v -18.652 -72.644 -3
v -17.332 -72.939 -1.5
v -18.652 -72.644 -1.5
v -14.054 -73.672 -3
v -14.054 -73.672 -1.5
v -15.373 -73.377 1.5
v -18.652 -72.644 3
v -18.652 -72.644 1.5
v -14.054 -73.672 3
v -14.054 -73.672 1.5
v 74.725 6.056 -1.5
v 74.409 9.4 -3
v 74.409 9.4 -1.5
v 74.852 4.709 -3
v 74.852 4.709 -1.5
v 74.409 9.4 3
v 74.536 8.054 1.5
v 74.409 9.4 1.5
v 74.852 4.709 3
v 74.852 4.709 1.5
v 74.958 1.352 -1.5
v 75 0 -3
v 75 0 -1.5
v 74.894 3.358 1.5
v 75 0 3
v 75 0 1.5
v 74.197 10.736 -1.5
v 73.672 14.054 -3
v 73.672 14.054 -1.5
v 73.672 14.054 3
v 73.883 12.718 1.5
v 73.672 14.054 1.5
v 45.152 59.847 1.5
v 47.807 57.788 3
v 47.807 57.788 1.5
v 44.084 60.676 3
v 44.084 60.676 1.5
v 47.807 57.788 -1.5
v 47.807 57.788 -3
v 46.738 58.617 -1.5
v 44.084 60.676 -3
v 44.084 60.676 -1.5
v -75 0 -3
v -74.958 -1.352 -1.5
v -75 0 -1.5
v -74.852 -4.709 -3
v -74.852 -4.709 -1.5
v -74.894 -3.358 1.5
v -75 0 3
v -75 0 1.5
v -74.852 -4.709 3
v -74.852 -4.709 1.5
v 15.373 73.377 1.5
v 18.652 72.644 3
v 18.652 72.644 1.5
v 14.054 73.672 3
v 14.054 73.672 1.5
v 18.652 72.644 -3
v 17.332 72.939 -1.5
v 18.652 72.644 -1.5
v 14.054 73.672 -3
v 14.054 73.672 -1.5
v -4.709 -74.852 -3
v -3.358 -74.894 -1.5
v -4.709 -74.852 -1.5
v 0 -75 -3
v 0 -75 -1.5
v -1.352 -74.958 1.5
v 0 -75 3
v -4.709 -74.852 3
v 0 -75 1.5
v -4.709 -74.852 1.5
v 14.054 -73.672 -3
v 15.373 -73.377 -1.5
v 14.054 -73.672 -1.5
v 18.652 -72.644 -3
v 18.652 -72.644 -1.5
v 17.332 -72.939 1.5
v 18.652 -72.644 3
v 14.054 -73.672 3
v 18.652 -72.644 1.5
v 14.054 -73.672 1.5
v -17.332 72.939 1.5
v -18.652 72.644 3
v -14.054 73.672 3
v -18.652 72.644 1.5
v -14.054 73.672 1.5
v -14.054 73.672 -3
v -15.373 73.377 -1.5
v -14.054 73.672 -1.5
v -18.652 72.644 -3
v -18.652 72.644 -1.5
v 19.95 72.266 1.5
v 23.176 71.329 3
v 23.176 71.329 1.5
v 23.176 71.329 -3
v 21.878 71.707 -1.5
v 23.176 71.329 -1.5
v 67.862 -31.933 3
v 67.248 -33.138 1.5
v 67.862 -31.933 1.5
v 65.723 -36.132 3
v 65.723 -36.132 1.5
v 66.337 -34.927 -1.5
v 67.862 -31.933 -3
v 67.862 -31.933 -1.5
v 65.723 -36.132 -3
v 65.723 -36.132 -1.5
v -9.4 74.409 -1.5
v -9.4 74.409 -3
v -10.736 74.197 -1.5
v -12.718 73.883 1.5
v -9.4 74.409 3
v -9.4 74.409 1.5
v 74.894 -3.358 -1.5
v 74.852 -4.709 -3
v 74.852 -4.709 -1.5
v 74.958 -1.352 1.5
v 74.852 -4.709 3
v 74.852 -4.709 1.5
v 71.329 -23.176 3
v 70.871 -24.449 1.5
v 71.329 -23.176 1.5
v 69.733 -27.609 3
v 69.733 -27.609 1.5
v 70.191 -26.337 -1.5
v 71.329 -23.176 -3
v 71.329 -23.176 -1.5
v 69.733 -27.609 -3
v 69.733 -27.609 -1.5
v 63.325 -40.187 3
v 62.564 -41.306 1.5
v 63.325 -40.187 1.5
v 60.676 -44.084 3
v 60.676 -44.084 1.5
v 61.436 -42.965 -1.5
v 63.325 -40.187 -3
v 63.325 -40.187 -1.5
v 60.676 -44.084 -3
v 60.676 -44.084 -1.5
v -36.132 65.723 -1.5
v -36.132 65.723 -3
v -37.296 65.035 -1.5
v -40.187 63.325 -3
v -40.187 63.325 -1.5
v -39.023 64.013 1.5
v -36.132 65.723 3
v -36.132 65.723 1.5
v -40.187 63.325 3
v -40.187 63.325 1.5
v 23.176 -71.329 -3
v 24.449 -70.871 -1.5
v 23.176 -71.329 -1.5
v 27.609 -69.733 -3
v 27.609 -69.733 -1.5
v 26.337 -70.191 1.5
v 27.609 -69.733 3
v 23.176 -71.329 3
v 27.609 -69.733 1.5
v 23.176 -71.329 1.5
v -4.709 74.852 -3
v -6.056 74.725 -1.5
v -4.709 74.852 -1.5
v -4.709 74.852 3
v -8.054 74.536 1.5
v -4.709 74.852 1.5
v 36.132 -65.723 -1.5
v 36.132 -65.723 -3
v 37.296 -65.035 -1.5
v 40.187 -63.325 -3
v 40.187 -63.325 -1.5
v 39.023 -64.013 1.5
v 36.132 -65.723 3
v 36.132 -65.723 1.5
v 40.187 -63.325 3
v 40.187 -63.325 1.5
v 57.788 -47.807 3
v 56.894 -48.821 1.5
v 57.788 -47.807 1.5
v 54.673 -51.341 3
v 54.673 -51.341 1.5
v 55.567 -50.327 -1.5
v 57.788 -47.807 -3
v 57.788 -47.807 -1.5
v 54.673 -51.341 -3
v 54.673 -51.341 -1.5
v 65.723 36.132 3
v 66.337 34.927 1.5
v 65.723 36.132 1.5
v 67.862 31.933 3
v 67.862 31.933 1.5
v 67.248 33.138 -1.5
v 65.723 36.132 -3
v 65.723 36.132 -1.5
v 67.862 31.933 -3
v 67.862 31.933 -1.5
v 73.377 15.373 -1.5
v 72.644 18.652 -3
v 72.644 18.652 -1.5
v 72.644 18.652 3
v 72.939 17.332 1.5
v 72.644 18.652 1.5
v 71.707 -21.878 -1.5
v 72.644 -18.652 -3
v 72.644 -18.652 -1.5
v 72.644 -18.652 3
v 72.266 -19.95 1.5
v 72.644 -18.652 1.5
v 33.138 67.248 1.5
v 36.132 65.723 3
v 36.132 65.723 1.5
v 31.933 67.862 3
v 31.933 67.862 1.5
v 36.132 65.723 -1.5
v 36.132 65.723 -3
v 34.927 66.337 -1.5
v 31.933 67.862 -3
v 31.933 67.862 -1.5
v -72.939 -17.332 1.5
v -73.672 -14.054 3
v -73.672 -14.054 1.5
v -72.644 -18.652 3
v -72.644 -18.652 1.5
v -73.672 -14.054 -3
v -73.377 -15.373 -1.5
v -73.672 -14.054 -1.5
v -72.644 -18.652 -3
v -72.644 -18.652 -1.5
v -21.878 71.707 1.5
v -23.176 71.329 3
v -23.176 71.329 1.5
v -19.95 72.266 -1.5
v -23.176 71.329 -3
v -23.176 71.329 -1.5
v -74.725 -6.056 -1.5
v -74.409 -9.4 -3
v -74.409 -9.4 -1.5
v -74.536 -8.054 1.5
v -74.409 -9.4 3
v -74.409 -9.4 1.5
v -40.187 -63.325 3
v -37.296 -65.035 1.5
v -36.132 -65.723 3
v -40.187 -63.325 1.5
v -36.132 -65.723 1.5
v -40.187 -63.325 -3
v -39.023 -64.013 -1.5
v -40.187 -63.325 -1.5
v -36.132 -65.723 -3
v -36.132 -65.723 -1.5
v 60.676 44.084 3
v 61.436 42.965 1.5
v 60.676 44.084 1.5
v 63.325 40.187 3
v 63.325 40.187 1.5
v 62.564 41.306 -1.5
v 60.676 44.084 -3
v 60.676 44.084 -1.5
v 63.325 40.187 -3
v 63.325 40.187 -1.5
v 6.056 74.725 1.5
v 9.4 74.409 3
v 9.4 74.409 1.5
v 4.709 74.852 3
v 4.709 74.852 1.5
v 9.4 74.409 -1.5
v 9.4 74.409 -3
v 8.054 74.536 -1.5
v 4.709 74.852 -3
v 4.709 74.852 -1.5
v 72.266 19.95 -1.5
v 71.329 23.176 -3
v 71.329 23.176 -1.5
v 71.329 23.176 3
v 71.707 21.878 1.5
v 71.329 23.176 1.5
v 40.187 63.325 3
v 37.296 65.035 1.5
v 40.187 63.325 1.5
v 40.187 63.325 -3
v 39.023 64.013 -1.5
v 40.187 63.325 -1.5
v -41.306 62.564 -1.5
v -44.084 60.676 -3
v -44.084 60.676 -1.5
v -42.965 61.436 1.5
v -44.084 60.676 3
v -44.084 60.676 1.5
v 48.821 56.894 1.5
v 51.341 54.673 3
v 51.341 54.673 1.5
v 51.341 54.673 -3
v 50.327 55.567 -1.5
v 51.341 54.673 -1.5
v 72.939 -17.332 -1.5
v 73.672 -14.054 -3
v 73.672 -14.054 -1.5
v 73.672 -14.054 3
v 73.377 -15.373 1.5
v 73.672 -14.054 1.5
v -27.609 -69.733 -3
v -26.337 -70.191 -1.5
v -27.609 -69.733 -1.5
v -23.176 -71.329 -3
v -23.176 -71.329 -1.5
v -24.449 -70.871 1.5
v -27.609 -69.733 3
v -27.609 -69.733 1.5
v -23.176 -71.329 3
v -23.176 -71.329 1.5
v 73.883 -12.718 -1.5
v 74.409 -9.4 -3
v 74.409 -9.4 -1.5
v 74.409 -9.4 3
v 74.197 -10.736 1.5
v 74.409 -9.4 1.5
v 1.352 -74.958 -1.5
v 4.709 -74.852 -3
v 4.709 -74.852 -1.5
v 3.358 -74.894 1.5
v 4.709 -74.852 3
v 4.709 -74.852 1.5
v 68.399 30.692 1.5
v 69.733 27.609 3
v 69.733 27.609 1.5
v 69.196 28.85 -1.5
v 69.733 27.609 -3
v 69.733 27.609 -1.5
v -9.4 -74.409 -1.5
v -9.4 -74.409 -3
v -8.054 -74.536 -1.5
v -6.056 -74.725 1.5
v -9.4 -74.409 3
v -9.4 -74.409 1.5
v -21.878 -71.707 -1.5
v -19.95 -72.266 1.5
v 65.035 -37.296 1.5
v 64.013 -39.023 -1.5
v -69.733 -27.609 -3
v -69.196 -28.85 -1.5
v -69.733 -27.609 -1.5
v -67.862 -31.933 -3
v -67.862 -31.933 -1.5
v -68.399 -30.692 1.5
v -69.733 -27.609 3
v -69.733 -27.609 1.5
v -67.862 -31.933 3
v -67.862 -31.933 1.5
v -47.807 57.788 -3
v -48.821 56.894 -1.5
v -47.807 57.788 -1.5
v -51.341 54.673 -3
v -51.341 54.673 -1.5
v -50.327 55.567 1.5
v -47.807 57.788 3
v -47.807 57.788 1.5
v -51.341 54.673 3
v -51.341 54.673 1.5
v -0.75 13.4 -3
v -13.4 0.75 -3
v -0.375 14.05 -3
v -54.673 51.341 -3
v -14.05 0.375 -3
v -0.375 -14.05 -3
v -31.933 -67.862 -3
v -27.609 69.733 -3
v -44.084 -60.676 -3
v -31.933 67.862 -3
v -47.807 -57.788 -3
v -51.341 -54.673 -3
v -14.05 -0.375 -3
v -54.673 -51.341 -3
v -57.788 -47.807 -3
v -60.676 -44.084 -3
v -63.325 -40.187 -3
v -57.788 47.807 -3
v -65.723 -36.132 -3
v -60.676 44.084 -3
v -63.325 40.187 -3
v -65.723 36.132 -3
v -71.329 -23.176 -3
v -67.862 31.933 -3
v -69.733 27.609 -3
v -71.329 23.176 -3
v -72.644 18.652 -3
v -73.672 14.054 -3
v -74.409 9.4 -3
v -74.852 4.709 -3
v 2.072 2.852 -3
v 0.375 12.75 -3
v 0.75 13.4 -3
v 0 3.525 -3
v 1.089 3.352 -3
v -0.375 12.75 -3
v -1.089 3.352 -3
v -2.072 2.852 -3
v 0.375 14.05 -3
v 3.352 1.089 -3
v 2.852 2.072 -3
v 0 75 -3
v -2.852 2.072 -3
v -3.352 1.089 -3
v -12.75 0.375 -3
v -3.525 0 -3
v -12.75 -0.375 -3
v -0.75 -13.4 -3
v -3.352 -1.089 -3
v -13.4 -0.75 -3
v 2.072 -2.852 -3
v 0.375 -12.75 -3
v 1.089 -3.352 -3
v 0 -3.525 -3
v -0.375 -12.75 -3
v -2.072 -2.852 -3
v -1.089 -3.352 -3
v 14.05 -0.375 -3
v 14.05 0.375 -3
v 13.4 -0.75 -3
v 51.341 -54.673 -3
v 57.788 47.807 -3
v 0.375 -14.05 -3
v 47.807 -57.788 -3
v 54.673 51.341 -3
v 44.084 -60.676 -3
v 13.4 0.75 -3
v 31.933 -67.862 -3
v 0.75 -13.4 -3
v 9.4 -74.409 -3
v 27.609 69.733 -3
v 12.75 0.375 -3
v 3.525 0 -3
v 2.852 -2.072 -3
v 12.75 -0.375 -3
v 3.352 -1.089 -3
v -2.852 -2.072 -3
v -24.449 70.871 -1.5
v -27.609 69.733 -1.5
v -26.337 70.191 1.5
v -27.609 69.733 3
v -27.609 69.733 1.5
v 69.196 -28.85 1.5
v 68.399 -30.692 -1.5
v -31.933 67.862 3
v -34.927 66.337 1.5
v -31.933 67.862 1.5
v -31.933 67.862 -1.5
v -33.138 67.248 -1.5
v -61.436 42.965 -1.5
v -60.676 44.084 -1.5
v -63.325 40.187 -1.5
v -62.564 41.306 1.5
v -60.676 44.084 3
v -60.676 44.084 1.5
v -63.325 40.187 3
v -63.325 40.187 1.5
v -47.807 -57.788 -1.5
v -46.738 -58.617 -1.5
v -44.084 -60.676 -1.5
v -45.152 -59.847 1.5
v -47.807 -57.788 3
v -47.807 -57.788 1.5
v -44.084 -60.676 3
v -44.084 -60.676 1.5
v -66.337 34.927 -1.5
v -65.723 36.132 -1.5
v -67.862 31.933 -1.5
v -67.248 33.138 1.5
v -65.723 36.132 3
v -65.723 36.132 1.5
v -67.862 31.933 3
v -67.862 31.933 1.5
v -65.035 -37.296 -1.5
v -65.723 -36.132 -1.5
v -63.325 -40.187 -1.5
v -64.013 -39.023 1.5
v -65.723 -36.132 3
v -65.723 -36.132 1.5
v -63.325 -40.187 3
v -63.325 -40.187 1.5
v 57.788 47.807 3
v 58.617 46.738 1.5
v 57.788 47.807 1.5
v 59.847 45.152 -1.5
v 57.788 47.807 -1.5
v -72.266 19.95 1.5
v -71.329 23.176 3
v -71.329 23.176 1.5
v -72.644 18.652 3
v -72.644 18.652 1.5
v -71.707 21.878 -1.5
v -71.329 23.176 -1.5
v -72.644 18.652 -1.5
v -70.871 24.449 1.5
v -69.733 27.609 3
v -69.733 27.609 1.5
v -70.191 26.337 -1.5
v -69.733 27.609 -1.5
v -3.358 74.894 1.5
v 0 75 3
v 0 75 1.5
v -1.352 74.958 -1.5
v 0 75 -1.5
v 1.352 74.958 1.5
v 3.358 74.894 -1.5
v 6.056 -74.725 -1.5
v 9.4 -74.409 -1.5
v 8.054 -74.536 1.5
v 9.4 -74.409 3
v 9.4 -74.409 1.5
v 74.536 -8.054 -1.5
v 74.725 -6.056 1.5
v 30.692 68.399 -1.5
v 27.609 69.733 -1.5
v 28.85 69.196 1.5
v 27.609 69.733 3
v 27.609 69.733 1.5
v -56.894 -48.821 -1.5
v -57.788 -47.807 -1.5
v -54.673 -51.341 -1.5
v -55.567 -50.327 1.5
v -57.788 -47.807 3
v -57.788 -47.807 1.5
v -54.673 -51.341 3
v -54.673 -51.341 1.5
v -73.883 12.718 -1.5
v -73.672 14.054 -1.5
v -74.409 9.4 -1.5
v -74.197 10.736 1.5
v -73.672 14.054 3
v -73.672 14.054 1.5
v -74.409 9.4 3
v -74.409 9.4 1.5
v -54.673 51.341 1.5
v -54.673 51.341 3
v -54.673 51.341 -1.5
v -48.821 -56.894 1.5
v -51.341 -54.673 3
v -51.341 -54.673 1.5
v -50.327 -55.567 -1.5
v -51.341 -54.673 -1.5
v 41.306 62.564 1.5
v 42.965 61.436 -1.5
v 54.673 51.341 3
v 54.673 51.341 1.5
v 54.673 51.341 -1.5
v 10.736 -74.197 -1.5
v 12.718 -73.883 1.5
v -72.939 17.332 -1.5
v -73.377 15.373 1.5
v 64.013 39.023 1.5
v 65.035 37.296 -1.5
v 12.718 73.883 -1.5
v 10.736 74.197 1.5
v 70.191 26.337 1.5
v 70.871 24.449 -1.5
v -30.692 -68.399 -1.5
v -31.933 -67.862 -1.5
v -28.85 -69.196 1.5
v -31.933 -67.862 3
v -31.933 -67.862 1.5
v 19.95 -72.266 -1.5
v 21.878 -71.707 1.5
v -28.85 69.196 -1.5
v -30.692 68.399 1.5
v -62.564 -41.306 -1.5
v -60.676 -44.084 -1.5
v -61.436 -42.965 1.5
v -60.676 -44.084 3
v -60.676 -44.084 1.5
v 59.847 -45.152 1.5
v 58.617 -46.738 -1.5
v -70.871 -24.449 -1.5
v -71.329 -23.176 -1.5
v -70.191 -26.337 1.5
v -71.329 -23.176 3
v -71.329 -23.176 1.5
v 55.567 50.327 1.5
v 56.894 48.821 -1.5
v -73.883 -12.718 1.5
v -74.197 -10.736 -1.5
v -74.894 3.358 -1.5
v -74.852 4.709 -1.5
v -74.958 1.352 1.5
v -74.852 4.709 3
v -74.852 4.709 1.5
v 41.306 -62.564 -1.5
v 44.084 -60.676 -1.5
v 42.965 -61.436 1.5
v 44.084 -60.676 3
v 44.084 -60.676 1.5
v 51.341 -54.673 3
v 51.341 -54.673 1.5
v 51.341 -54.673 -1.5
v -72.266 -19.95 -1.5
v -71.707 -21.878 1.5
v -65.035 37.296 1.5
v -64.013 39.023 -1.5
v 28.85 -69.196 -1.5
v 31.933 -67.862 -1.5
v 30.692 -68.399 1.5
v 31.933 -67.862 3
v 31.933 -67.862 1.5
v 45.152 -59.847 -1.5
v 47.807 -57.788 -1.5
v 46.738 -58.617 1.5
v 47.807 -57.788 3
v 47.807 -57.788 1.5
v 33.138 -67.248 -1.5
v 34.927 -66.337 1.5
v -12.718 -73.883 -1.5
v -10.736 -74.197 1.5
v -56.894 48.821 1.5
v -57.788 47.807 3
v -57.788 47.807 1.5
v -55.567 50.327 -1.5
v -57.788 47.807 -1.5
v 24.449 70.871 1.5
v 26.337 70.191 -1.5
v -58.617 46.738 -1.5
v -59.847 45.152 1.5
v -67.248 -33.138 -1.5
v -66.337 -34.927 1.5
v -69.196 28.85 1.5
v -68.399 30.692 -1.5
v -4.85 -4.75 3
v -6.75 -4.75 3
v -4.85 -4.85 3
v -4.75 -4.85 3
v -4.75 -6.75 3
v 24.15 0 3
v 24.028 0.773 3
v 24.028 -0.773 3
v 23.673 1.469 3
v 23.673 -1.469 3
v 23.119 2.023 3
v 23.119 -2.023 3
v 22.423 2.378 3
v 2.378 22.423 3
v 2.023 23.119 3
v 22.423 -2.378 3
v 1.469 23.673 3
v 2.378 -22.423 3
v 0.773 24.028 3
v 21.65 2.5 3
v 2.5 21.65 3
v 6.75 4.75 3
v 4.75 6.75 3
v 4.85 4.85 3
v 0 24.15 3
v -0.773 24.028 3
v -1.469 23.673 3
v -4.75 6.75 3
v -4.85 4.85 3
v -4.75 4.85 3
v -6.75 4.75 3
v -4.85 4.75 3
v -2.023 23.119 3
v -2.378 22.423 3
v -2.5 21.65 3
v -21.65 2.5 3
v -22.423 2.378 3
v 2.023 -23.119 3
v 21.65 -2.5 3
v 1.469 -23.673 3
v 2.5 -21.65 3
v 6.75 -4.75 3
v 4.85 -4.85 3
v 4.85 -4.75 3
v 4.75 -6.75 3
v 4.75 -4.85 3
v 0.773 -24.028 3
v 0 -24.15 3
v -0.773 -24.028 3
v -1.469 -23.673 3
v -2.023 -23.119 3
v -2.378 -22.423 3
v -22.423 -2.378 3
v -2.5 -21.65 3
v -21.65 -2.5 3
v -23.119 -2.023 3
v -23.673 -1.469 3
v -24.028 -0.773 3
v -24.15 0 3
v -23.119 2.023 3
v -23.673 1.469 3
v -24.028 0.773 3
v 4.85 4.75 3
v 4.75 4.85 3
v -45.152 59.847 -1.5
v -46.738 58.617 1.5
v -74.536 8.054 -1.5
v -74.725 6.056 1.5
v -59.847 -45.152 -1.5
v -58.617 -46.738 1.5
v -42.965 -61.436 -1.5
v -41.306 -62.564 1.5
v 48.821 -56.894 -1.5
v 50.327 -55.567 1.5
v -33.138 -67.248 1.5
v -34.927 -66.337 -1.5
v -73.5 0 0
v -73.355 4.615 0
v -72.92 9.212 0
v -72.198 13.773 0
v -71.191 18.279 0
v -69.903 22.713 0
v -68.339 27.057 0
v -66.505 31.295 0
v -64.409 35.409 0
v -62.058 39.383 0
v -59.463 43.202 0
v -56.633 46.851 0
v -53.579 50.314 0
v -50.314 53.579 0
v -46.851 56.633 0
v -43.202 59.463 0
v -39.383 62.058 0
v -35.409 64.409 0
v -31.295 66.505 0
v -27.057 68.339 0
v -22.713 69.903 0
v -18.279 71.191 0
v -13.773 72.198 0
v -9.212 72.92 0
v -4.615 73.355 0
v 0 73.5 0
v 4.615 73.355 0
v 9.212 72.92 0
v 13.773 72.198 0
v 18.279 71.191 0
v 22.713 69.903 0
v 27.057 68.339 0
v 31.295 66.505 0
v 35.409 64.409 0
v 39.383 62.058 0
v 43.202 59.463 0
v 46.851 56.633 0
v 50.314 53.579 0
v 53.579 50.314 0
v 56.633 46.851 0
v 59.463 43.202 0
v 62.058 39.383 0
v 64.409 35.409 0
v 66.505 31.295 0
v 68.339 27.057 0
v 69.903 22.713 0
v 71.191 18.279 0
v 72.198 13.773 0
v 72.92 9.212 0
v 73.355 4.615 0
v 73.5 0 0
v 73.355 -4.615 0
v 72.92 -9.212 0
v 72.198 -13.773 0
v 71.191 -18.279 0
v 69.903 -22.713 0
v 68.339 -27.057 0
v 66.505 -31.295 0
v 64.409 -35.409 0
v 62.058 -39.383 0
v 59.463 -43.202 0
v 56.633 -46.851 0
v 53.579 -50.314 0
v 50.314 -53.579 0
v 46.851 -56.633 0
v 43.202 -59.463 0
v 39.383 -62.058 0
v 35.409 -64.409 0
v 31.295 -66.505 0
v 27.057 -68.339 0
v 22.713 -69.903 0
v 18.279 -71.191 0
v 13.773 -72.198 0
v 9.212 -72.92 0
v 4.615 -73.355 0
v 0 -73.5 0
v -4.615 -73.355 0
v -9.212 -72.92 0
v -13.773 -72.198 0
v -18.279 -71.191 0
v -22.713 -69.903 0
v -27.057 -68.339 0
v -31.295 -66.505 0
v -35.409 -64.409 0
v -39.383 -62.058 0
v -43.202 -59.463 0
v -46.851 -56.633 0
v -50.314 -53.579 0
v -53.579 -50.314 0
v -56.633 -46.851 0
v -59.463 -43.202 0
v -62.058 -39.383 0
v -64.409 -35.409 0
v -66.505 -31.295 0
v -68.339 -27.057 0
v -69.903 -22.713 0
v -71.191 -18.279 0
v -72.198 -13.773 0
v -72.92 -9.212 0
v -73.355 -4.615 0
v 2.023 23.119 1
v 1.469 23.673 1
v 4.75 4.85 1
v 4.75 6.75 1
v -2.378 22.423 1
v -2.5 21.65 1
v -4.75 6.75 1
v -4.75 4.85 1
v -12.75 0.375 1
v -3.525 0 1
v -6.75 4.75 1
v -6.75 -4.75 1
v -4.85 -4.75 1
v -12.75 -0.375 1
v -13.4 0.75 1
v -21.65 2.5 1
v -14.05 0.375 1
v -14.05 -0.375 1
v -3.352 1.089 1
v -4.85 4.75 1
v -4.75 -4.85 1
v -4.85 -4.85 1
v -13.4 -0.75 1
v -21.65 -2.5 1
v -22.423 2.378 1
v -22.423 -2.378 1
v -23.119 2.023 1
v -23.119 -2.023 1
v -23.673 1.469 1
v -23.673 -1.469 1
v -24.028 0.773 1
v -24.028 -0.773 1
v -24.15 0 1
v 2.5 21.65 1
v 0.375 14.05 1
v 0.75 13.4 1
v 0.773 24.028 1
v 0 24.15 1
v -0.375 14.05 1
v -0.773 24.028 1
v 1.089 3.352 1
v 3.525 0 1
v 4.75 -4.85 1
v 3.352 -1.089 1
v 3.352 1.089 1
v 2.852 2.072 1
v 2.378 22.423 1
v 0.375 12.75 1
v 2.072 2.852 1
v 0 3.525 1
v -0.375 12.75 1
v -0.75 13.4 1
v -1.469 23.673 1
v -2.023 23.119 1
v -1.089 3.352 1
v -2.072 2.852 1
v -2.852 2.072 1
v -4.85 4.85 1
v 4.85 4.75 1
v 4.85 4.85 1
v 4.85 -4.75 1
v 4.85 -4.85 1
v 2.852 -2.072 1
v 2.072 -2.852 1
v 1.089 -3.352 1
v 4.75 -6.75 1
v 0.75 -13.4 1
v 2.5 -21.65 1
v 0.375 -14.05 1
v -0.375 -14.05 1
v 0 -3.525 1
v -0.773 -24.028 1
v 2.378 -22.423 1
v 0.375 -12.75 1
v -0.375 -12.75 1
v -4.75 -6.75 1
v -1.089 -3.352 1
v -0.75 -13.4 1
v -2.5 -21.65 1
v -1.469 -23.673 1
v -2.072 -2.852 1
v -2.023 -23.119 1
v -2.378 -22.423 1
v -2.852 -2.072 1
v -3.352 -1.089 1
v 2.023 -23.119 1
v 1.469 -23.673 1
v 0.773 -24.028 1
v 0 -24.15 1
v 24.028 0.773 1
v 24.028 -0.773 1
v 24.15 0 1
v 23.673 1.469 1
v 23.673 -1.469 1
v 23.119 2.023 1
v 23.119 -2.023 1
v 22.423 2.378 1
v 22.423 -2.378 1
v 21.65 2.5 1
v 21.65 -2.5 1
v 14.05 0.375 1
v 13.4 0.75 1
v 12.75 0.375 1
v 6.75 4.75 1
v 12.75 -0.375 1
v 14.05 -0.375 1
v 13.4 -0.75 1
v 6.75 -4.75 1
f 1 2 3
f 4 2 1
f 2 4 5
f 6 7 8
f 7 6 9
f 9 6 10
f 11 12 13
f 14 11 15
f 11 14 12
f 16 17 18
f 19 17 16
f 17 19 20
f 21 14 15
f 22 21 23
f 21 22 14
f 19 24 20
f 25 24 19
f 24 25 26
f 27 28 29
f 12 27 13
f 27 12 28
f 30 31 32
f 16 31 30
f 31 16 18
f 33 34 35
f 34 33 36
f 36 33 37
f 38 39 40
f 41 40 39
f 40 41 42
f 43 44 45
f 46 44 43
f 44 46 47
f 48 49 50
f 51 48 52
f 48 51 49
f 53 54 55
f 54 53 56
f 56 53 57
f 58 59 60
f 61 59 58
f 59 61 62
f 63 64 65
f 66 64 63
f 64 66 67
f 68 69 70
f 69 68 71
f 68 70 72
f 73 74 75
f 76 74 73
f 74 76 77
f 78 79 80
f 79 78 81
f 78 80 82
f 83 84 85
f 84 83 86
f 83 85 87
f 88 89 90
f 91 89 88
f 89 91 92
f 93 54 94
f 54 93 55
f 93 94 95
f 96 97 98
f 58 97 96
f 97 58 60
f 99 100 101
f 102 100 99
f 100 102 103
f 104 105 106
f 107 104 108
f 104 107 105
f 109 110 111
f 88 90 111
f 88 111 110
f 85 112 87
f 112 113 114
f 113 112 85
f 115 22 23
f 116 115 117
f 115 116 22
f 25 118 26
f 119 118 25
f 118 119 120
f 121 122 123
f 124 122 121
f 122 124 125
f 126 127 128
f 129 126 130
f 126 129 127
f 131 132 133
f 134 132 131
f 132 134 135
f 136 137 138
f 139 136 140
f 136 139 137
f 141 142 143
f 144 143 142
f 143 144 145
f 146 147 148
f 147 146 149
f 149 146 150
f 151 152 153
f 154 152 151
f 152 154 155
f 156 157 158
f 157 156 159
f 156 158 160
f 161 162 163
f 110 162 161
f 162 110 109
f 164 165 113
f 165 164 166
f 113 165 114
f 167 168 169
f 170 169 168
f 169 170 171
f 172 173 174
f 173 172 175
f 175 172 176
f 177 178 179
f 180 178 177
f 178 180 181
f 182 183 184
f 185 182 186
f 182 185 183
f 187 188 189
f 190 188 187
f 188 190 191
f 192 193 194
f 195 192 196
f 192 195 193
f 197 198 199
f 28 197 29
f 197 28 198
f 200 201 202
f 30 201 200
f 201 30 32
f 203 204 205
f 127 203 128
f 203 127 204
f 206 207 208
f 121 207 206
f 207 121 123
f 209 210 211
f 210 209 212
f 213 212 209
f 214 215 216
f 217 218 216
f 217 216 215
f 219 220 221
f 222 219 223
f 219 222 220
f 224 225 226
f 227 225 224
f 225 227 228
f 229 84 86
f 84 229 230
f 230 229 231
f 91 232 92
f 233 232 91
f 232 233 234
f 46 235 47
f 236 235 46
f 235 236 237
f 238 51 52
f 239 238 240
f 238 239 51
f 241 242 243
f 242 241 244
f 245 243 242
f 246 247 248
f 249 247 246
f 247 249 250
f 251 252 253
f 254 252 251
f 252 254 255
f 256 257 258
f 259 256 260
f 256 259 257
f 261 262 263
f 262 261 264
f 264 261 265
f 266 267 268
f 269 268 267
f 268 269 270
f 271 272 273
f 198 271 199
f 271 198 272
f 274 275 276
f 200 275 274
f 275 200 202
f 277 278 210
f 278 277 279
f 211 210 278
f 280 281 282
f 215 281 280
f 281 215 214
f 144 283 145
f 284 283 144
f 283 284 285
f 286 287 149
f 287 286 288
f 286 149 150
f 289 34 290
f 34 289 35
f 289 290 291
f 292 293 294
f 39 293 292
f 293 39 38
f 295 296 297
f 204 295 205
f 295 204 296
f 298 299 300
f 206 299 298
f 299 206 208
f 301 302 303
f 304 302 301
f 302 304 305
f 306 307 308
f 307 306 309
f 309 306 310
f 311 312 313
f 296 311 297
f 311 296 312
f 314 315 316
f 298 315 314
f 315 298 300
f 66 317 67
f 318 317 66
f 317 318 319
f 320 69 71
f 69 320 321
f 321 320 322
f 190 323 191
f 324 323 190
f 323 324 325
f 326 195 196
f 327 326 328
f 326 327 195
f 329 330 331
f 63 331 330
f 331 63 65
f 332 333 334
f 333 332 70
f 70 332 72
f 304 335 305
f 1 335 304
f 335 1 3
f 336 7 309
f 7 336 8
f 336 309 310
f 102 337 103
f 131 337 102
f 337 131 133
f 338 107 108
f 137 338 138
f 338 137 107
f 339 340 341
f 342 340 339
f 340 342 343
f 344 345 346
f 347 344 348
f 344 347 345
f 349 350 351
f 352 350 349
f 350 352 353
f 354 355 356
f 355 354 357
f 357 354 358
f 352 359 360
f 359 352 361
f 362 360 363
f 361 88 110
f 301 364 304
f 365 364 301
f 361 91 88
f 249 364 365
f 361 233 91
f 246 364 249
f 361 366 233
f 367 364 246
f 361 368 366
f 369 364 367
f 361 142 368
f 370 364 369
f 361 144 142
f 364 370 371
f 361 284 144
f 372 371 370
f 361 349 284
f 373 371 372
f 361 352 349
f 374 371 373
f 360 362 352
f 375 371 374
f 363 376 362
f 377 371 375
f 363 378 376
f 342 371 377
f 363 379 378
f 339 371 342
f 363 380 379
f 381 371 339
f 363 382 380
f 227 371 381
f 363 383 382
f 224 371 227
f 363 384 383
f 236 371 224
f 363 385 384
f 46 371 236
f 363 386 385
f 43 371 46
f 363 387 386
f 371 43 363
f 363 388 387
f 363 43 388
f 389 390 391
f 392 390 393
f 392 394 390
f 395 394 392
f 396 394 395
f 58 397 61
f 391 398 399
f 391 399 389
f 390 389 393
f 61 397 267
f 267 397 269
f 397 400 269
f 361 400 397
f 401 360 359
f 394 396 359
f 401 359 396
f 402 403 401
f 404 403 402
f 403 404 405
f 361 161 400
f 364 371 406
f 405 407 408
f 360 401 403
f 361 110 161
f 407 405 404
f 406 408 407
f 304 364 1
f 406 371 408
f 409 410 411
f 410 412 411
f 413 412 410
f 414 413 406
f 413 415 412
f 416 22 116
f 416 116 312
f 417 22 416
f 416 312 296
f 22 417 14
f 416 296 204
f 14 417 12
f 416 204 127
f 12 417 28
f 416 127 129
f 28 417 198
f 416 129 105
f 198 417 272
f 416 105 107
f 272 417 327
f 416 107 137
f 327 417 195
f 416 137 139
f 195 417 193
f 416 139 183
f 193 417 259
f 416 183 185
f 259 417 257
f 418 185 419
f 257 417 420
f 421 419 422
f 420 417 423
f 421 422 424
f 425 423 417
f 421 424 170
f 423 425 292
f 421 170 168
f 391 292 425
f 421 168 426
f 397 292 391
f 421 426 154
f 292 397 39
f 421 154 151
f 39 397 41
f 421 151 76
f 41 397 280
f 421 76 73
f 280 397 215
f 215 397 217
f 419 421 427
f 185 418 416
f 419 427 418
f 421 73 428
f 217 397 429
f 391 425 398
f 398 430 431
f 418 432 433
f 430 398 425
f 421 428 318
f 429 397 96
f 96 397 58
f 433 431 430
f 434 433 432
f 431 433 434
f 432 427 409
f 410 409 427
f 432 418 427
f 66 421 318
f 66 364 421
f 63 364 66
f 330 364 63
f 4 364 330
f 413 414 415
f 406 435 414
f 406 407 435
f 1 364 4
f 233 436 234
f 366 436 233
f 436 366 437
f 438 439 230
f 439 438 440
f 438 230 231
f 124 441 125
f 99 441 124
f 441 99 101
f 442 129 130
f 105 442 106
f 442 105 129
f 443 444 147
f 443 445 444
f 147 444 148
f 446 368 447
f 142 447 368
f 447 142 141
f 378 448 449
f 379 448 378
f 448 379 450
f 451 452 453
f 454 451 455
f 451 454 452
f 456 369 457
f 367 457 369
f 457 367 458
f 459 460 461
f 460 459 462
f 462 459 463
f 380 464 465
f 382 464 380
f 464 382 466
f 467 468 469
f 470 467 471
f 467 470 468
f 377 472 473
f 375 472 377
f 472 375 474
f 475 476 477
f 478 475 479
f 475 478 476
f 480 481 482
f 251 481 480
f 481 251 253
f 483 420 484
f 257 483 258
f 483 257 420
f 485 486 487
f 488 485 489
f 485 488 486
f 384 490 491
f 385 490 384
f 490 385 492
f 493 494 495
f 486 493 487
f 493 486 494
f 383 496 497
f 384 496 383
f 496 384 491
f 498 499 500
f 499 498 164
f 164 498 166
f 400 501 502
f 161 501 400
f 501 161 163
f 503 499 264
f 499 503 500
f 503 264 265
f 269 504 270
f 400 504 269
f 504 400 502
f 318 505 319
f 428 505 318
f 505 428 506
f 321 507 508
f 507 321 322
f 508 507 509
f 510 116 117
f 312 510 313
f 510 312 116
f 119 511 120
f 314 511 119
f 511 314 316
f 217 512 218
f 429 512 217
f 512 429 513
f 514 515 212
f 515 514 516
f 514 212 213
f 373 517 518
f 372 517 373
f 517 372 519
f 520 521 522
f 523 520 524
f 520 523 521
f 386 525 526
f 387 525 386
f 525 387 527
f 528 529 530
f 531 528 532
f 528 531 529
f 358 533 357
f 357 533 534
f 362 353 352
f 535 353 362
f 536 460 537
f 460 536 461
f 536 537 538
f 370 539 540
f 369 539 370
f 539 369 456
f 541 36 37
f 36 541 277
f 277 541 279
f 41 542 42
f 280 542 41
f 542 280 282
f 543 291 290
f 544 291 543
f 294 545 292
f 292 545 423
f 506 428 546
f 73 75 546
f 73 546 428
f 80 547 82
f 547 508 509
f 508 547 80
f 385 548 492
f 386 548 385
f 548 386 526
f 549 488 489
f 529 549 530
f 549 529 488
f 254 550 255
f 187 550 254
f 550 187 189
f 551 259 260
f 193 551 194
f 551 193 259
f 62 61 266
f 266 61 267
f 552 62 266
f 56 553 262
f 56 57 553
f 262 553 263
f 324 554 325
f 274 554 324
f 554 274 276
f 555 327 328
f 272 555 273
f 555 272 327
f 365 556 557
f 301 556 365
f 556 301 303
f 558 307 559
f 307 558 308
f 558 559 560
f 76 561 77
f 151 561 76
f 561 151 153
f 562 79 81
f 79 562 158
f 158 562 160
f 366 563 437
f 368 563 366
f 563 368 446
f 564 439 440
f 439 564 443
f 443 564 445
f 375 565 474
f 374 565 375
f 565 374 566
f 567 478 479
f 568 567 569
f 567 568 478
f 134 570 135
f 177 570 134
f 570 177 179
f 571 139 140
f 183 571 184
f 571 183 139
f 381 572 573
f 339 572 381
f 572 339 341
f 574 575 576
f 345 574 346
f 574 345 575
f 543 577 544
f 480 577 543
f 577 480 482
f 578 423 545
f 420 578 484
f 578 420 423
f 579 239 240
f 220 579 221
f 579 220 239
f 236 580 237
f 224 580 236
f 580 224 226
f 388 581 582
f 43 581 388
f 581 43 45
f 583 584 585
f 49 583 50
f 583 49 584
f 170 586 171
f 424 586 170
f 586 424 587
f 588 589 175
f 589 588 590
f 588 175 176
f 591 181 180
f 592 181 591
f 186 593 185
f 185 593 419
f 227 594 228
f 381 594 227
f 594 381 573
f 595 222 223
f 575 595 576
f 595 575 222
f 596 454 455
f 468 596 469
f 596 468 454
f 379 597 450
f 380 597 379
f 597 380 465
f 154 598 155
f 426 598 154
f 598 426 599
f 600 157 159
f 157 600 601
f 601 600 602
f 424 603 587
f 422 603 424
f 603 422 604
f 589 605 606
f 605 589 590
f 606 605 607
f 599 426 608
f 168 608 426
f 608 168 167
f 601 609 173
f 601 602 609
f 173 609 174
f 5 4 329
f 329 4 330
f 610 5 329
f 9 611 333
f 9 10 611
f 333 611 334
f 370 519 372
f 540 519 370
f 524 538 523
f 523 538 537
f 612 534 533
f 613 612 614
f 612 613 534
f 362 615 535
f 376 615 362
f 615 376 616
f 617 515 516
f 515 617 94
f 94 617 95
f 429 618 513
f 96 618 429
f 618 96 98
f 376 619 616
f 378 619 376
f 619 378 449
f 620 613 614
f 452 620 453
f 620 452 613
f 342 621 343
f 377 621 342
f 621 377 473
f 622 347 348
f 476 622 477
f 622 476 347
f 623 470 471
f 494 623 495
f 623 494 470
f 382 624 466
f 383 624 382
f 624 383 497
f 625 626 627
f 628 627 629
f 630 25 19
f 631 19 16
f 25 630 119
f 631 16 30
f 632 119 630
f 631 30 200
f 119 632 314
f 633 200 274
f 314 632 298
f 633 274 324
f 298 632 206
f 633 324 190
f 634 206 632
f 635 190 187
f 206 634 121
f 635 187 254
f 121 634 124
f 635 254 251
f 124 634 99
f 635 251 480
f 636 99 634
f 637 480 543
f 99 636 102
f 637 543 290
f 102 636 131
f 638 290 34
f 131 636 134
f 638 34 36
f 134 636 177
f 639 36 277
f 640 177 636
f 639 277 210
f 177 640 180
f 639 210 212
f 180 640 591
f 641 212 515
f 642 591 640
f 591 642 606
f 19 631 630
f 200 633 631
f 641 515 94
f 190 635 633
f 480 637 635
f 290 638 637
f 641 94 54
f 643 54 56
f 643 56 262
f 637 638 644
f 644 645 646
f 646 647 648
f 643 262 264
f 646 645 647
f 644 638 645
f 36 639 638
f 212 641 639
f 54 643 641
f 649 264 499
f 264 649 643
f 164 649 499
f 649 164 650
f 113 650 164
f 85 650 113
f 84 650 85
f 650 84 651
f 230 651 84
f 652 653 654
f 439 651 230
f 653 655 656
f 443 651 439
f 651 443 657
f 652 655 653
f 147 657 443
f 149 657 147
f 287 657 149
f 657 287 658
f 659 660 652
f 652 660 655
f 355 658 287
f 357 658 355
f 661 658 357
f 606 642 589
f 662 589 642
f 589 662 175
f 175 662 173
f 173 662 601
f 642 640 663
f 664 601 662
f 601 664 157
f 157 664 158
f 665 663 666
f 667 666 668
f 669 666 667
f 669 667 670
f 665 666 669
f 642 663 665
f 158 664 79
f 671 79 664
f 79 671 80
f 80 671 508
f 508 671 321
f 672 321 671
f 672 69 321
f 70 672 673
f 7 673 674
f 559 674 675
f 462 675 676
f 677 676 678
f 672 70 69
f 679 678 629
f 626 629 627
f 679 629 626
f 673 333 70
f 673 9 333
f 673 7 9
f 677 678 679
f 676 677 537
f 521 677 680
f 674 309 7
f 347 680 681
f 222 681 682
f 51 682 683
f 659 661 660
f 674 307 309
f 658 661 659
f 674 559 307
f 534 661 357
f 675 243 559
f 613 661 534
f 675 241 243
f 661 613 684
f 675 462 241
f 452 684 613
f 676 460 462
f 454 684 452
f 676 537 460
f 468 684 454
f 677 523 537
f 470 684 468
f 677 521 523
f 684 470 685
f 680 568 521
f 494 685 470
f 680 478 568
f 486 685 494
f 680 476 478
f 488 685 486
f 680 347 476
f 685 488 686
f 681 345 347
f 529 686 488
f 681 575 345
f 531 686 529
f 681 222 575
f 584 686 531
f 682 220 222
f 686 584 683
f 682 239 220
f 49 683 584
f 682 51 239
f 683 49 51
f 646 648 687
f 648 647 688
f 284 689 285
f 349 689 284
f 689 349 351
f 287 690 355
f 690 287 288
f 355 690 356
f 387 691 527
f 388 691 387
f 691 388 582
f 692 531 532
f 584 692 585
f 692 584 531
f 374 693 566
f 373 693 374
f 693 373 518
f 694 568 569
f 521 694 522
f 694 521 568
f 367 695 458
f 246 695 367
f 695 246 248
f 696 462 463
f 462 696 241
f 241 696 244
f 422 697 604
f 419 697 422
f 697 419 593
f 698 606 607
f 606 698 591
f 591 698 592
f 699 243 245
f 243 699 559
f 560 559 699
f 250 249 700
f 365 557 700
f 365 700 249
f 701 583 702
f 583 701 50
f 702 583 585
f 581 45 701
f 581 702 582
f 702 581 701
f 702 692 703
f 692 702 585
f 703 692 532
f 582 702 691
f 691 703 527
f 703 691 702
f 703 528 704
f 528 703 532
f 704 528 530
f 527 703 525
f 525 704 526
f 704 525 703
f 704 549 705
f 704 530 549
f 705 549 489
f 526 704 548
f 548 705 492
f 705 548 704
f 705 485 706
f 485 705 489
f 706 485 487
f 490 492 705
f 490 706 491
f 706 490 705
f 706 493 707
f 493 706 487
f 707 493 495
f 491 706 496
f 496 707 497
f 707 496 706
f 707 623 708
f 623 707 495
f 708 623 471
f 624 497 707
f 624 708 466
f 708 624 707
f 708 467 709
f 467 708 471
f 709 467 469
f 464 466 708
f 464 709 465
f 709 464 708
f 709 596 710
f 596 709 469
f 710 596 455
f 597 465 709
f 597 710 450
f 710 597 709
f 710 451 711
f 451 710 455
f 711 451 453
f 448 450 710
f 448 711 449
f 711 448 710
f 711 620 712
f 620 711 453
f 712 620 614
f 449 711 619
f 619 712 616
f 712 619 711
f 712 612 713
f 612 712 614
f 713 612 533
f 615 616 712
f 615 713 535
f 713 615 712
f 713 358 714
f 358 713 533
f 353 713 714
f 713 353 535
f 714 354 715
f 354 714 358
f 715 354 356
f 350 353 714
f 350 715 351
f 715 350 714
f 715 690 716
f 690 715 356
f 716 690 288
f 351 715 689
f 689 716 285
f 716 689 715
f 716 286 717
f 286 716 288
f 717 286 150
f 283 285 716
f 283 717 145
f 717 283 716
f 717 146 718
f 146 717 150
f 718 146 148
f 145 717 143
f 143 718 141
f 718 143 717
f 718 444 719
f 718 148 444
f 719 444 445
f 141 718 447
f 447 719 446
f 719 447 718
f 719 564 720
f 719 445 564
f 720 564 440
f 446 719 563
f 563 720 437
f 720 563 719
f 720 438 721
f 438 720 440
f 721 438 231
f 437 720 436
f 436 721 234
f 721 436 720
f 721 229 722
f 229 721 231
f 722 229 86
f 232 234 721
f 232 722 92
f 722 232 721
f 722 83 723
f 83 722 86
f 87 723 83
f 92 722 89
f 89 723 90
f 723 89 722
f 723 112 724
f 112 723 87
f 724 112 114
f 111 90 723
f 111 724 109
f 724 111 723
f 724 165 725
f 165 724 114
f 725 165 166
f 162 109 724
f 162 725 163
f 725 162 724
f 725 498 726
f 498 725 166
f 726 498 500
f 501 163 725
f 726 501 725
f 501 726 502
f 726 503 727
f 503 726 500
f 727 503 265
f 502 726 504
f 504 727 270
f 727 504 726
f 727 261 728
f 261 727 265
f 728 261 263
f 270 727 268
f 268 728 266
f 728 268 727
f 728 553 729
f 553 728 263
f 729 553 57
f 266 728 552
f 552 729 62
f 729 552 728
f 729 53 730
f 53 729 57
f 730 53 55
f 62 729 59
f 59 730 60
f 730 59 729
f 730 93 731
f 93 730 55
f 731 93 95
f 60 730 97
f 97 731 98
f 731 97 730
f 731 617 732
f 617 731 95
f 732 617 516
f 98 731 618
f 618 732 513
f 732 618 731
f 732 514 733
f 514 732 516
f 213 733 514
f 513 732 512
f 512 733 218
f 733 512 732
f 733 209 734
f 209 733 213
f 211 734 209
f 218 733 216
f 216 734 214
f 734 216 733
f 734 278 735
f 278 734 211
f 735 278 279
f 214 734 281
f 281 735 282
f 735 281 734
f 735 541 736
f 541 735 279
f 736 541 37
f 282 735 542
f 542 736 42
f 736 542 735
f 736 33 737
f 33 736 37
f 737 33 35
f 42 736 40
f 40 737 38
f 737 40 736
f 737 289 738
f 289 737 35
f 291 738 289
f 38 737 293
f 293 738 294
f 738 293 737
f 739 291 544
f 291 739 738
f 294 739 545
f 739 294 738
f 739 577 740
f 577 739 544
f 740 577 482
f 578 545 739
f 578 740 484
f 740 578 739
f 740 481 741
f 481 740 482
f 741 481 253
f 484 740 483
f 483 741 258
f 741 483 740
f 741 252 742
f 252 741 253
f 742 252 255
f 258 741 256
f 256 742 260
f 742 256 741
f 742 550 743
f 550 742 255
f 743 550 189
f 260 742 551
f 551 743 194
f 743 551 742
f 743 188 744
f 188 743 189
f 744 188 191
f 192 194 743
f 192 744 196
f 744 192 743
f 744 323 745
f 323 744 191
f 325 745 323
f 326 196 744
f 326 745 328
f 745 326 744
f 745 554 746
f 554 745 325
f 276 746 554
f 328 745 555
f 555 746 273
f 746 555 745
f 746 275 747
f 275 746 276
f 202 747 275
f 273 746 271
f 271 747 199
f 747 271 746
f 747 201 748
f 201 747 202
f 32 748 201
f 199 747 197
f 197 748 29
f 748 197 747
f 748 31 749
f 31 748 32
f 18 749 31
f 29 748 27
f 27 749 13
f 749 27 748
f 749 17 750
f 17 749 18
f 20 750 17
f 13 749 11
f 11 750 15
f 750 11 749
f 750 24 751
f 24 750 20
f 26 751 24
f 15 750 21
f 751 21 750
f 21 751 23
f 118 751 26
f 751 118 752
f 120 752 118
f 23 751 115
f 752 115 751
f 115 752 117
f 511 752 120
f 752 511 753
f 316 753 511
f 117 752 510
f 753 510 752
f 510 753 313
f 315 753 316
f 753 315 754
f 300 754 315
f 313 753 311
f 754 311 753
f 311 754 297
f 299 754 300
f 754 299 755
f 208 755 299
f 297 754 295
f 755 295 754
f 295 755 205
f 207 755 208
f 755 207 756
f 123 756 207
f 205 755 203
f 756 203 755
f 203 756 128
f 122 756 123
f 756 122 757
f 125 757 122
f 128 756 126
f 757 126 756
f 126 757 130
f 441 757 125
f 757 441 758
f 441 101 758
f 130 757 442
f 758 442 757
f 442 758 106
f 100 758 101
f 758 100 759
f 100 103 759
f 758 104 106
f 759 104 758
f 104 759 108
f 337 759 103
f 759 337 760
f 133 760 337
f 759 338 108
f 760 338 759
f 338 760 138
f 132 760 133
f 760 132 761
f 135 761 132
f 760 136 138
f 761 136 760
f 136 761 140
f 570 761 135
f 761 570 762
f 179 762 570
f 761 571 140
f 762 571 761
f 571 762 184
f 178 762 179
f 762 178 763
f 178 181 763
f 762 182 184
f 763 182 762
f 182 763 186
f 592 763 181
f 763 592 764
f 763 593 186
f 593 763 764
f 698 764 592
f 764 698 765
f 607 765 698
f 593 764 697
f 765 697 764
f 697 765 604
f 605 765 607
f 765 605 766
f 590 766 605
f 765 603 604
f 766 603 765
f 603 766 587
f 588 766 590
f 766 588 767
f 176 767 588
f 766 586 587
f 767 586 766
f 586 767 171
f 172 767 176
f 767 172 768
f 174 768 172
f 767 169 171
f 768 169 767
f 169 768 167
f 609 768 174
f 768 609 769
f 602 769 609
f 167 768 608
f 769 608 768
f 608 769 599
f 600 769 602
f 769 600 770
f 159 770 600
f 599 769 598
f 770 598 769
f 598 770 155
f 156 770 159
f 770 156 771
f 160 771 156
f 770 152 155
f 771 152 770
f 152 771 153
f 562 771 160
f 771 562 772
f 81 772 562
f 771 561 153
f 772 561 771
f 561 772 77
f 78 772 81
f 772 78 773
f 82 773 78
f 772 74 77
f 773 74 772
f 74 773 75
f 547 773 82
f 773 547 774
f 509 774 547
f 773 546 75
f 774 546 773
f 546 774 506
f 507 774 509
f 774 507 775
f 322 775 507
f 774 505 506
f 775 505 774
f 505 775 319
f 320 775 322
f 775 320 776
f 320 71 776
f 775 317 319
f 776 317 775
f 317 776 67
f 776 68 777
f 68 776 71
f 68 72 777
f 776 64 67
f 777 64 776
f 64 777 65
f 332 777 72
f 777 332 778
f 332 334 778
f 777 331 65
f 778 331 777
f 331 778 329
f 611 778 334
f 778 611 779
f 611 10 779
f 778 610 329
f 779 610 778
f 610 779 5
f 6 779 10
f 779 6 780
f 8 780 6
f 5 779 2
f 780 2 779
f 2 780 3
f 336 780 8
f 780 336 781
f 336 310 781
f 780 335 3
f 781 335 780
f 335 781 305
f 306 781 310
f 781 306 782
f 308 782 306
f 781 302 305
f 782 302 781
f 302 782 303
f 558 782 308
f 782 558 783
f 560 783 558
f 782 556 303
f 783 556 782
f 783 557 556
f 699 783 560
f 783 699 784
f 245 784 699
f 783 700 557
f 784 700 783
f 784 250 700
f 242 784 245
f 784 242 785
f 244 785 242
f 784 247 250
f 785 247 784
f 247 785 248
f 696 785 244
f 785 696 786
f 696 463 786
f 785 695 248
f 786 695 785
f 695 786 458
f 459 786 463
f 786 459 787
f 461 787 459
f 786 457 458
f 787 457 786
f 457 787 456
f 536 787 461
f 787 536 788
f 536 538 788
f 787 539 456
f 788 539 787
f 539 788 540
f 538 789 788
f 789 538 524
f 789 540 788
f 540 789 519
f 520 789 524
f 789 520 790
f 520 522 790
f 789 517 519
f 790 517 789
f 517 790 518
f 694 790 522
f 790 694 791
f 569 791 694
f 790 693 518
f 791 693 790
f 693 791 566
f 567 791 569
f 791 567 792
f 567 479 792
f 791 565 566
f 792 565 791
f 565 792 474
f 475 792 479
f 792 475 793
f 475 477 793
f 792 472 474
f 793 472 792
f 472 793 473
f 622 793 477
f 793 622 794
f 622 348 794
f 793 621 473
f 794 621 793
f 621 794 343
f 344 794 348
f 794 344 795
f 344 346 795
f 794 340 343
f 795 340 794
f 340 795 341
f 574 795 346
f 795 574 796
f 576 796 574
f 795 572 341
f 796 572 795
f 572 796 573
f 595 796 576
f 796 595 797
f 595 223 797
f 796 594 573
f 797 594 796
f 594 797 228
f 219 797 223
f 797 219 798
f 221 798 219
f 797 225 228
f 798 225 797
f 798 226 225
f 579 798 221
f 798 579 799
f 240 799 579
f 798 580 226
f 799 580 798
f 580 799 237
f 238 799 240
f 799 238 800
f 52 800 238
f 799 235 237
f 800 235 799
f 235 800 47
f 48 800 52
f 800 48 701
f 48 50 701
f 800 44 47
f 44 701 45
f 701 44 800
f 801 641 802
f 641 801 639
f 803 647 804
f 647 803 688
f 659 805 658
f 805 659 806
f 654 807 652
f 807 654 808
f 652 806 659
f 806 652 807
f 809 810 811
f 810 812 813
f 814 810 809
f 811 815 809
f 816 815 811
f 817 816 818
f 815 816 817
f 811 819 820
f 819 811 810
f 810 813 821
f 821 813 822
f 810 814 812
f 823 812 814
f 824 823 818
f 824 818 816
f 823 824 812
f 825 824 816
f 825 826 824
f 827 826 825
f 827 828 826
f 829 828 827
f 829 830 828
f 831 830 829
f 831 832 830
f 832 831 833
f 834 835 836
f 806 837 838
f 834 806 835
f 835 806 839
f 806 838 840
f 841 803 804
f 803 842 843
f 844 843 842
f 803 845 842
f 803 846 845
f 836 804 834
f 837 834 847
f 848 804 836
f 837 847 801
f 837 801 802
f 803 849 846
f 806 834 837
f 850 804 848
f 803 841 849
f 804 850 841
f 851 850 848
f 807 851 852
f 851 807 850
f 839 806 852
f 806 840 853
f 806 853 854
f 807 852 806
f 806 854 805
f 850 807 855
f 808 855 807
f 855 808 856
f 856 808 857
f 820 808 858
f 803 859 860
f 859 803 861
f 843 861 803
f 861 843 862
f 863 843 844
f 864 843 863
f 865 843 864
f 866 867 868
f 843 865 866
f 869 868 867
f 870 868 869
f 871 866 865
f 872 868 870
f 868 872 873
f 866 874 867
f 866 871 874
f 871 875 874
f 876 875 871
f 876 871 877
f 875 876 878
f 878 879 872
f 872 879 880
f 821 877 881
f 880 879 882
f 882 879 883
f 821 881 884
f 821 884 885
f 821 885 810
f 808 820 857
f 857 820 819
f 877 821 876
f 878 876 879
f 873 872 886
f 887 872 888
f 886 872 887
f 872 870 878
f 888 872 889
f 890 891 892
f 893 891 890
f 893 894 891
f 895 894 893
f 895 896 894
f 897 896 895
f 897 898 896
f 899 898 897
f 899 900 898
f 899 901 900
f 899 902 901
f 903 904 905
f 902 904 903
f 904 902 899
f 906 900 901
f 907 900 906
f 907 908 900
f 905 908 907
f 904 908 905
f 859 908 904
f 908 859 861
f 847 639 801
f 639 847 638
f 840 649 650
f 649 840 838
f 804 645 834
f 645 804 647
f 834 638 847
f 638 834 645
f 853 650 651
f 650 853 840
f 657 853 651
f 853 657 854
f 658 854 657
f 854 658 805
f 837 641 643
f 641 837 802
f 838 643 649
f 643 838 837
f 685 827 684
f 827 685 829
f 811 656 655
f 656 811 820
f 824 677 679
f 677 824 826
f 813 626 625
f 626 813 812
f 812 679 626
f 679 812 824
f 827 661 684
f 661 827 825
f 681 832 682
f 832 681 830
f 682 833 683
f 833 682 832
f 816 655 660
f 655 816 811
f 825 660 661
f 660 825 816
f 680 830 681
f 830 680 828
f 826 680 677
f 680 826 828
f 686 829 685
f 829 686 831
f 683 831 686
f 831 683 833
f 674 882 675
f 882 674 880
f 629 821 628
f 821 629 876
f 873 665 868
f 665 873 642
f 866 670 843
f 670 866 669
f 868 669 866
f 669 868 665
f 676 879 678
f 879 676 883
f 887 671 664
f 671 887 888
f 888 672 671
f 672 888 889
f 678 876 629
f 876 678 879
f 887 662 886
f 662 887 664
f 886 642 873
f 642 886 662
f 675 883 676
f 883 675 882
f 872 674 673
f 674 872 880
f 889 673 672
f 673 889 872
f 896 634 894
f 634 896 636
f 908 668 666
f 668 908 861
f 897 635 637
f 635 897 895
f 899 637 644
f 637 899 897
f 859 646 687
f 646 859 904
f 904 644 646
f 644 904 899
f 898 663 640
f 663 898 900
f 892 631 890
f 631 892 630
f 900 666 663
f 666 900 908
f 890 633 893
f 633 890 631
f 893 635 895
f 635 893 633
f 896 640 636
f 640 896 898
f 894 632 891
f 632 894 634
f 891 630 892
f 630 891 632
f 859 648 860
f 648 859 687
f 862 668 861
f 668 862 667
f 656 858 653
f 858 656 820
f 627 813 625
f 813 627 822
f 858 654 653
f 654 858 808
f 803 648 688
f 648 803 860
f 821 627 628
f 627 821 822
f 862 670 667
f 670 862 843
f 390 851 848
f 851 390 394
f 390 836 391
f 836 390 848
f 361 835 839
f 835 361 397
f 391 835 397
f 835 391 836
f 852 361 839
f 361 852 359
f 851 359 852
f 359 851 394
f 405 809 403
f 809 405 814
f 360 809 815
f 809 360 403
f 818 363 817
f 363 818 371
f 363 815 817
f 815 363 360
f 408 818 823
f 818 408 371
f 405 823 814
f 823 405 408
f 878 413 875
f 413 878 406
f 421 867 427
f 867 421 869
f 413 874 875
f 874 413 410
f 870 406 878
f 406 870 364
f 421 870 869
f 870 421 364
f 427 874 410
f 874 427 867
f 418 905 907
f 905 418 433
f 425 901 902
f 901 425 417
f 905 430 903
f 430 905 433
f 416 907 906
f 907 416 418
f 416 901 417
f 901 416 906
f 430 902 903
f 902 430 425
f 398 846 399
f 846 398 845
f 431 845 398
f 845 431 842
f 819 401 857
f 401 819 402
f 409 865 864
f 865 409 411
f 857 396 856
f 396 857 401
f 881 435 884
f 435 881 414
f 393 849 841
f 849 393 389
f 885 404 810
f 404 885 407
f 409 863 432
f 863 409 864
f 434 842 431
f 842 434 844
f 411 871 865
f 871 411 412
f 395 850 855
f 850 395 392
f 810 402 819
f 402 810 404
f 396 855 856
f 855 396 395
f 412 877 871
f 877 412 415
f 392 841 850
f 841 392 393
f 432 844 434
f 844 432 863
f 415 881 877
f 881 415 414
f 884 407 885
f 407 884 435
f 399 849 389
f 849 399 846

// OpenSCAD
//-------------------------------------------------------------
//-- Servo wheel for Parallax 900-0008
//
//-- Derived directly on that from
//-- (c) Juan Gonzalez (obijuan) juan@iearobotics.com
//-- March-2012
//-------------------------------------------------------------
//-- Wheel for mobile robots, driven by Parallax 900-0008 servos
//-------------------------------------------------------------

//-- Wheel parameters
wheel_or_idiam = 144;                  //-- O-ring inner diameter
wheel_or_diam  = 3;                    //-- O-ring section diameter
wheel_height   = 2*wheel_or_diam+0;    //-- Wheel height: change the 0 for 
                                       //-- other values
                                       
//-- Parameters common to all horns
horn_drill_diam   = 1.5;
horn_plate_height = 2;                  //-- plate height
horn_height       = wheel_height;       //-- Total height: shaft + plate

//-- Parallax 900-0008 4-arm horn parameters
a4h_end_diam       = 5;
a4h_center_diam    = 9.5;
a4h_arm_length     = 19.4;
a4h_drill_distance = 13.4;

hub_screw_diameter=7.05;


//-------------------------------------------------------
//--- Parameters:
//-- or_idiam: O-ring inner diameter
//-- or_diam:  O-ring section diameter
//-- h:        Height of the wheel
//--
//--  Module for generating a raw wheel, with no drills
//--  and no servo horn
//-------------------------------------------------------
module raw_wheel(or_idiam=50, or_diam=3, h=6)
{
  //-- Wheel parameters
  r = or_idiam/2 + or_diam;   //-- Radius

  //-- Temporal points
  l = or_diam*sqrt(2)/2;

  difference() {
    //-- Body of the wheel
    cylinder (r=r, h=h, $fn=100,center=true);

    //--  wheel's inner section
    rotate_extrude($fn=100)
      translate([r-or_diam/2,0,0])
      polygon( [ [0,0],[l,l],[l,-l] ] , [ [0,1,2] ]);
  }
}

//--------------------------------------------------------------
//-- Generic module for the horn's drills
//-- Parameters:
//--  d = drill's radial distance (from the horn's center)
//--  n = number of drills
//--  h = wheel height
//--------------------------------------------------------------
module horn_drills(d,n,h)
{
  union() {
    for ( i = [0 : n-1] ) {
        rotate([0,0,i*360/n])
        translate([0,d,0])
        cylinder(r=horn_drill_diam/2, h=h+10,center=true, $fn=6);  
      }
  }
}

//-----------------------------------------
//-- Parallax 900-0008 horn4 arm
//-- This module is just one arm
//-----------------------------------------
module horn4_arm(h=5)
{
  translate([0,a4h_arm_length-a4h_end_diam/2,0])
  //-- The arm consist of the perimeter of a cylinder and a cube
  hull() {
    cylinder(r=a4h_end_diam/2, h=h, center=true, $fn=20);
    translate([0,1-a4h_arm_length+a4h_end_diam/2,0])
      cube([a4h_center_diam,2,h],center=true);
  }
}

//-------------------------------------------
//-- Parallax 900-0008 4-arm horn
//-------------------------------------------
module horn4(h=5)
{
  union() {
    //-- Center part (is a square)
    cube([a4h_center_diam+0.2,a4h_center_diam+0.2,h],center=true);

    //-- Place the 4 arms in every side of the cube
    for ( i = [0 : 3] ) {
      rotate( [0,0,i*90])
      translate([0, a4h_center_diam/2, 0])
      horn4_arm(h);
    }
  }

}

//-------------------------------------------------------
//--  A Wheel for the Parallax 900-0008 4-arm horns
//--------------------------------------------------------
module Servo_wheel_4_arm_horn()
{
  difference() {
      raw_wheel(or_idiam=wheel_or_idiam, or_diam=wheel_or_diam, h=wheel_height);

      //-- Inner drill
      cylinder(center=true, h=2*wheel_height + 10, d=hub_screw_diameter,$fn=20);

      //-- substract the 4-arm servo horn
      translate([0,0,horn_height-horn_plate_height])
        horn4(h=wheel_height);

      //-- Horn drills
      horn_drills(d=a4h_drill_distance, n=4, h=wheel_height);
  }
}


//-- Test!
Servo_wheel_4_arm_horn();
